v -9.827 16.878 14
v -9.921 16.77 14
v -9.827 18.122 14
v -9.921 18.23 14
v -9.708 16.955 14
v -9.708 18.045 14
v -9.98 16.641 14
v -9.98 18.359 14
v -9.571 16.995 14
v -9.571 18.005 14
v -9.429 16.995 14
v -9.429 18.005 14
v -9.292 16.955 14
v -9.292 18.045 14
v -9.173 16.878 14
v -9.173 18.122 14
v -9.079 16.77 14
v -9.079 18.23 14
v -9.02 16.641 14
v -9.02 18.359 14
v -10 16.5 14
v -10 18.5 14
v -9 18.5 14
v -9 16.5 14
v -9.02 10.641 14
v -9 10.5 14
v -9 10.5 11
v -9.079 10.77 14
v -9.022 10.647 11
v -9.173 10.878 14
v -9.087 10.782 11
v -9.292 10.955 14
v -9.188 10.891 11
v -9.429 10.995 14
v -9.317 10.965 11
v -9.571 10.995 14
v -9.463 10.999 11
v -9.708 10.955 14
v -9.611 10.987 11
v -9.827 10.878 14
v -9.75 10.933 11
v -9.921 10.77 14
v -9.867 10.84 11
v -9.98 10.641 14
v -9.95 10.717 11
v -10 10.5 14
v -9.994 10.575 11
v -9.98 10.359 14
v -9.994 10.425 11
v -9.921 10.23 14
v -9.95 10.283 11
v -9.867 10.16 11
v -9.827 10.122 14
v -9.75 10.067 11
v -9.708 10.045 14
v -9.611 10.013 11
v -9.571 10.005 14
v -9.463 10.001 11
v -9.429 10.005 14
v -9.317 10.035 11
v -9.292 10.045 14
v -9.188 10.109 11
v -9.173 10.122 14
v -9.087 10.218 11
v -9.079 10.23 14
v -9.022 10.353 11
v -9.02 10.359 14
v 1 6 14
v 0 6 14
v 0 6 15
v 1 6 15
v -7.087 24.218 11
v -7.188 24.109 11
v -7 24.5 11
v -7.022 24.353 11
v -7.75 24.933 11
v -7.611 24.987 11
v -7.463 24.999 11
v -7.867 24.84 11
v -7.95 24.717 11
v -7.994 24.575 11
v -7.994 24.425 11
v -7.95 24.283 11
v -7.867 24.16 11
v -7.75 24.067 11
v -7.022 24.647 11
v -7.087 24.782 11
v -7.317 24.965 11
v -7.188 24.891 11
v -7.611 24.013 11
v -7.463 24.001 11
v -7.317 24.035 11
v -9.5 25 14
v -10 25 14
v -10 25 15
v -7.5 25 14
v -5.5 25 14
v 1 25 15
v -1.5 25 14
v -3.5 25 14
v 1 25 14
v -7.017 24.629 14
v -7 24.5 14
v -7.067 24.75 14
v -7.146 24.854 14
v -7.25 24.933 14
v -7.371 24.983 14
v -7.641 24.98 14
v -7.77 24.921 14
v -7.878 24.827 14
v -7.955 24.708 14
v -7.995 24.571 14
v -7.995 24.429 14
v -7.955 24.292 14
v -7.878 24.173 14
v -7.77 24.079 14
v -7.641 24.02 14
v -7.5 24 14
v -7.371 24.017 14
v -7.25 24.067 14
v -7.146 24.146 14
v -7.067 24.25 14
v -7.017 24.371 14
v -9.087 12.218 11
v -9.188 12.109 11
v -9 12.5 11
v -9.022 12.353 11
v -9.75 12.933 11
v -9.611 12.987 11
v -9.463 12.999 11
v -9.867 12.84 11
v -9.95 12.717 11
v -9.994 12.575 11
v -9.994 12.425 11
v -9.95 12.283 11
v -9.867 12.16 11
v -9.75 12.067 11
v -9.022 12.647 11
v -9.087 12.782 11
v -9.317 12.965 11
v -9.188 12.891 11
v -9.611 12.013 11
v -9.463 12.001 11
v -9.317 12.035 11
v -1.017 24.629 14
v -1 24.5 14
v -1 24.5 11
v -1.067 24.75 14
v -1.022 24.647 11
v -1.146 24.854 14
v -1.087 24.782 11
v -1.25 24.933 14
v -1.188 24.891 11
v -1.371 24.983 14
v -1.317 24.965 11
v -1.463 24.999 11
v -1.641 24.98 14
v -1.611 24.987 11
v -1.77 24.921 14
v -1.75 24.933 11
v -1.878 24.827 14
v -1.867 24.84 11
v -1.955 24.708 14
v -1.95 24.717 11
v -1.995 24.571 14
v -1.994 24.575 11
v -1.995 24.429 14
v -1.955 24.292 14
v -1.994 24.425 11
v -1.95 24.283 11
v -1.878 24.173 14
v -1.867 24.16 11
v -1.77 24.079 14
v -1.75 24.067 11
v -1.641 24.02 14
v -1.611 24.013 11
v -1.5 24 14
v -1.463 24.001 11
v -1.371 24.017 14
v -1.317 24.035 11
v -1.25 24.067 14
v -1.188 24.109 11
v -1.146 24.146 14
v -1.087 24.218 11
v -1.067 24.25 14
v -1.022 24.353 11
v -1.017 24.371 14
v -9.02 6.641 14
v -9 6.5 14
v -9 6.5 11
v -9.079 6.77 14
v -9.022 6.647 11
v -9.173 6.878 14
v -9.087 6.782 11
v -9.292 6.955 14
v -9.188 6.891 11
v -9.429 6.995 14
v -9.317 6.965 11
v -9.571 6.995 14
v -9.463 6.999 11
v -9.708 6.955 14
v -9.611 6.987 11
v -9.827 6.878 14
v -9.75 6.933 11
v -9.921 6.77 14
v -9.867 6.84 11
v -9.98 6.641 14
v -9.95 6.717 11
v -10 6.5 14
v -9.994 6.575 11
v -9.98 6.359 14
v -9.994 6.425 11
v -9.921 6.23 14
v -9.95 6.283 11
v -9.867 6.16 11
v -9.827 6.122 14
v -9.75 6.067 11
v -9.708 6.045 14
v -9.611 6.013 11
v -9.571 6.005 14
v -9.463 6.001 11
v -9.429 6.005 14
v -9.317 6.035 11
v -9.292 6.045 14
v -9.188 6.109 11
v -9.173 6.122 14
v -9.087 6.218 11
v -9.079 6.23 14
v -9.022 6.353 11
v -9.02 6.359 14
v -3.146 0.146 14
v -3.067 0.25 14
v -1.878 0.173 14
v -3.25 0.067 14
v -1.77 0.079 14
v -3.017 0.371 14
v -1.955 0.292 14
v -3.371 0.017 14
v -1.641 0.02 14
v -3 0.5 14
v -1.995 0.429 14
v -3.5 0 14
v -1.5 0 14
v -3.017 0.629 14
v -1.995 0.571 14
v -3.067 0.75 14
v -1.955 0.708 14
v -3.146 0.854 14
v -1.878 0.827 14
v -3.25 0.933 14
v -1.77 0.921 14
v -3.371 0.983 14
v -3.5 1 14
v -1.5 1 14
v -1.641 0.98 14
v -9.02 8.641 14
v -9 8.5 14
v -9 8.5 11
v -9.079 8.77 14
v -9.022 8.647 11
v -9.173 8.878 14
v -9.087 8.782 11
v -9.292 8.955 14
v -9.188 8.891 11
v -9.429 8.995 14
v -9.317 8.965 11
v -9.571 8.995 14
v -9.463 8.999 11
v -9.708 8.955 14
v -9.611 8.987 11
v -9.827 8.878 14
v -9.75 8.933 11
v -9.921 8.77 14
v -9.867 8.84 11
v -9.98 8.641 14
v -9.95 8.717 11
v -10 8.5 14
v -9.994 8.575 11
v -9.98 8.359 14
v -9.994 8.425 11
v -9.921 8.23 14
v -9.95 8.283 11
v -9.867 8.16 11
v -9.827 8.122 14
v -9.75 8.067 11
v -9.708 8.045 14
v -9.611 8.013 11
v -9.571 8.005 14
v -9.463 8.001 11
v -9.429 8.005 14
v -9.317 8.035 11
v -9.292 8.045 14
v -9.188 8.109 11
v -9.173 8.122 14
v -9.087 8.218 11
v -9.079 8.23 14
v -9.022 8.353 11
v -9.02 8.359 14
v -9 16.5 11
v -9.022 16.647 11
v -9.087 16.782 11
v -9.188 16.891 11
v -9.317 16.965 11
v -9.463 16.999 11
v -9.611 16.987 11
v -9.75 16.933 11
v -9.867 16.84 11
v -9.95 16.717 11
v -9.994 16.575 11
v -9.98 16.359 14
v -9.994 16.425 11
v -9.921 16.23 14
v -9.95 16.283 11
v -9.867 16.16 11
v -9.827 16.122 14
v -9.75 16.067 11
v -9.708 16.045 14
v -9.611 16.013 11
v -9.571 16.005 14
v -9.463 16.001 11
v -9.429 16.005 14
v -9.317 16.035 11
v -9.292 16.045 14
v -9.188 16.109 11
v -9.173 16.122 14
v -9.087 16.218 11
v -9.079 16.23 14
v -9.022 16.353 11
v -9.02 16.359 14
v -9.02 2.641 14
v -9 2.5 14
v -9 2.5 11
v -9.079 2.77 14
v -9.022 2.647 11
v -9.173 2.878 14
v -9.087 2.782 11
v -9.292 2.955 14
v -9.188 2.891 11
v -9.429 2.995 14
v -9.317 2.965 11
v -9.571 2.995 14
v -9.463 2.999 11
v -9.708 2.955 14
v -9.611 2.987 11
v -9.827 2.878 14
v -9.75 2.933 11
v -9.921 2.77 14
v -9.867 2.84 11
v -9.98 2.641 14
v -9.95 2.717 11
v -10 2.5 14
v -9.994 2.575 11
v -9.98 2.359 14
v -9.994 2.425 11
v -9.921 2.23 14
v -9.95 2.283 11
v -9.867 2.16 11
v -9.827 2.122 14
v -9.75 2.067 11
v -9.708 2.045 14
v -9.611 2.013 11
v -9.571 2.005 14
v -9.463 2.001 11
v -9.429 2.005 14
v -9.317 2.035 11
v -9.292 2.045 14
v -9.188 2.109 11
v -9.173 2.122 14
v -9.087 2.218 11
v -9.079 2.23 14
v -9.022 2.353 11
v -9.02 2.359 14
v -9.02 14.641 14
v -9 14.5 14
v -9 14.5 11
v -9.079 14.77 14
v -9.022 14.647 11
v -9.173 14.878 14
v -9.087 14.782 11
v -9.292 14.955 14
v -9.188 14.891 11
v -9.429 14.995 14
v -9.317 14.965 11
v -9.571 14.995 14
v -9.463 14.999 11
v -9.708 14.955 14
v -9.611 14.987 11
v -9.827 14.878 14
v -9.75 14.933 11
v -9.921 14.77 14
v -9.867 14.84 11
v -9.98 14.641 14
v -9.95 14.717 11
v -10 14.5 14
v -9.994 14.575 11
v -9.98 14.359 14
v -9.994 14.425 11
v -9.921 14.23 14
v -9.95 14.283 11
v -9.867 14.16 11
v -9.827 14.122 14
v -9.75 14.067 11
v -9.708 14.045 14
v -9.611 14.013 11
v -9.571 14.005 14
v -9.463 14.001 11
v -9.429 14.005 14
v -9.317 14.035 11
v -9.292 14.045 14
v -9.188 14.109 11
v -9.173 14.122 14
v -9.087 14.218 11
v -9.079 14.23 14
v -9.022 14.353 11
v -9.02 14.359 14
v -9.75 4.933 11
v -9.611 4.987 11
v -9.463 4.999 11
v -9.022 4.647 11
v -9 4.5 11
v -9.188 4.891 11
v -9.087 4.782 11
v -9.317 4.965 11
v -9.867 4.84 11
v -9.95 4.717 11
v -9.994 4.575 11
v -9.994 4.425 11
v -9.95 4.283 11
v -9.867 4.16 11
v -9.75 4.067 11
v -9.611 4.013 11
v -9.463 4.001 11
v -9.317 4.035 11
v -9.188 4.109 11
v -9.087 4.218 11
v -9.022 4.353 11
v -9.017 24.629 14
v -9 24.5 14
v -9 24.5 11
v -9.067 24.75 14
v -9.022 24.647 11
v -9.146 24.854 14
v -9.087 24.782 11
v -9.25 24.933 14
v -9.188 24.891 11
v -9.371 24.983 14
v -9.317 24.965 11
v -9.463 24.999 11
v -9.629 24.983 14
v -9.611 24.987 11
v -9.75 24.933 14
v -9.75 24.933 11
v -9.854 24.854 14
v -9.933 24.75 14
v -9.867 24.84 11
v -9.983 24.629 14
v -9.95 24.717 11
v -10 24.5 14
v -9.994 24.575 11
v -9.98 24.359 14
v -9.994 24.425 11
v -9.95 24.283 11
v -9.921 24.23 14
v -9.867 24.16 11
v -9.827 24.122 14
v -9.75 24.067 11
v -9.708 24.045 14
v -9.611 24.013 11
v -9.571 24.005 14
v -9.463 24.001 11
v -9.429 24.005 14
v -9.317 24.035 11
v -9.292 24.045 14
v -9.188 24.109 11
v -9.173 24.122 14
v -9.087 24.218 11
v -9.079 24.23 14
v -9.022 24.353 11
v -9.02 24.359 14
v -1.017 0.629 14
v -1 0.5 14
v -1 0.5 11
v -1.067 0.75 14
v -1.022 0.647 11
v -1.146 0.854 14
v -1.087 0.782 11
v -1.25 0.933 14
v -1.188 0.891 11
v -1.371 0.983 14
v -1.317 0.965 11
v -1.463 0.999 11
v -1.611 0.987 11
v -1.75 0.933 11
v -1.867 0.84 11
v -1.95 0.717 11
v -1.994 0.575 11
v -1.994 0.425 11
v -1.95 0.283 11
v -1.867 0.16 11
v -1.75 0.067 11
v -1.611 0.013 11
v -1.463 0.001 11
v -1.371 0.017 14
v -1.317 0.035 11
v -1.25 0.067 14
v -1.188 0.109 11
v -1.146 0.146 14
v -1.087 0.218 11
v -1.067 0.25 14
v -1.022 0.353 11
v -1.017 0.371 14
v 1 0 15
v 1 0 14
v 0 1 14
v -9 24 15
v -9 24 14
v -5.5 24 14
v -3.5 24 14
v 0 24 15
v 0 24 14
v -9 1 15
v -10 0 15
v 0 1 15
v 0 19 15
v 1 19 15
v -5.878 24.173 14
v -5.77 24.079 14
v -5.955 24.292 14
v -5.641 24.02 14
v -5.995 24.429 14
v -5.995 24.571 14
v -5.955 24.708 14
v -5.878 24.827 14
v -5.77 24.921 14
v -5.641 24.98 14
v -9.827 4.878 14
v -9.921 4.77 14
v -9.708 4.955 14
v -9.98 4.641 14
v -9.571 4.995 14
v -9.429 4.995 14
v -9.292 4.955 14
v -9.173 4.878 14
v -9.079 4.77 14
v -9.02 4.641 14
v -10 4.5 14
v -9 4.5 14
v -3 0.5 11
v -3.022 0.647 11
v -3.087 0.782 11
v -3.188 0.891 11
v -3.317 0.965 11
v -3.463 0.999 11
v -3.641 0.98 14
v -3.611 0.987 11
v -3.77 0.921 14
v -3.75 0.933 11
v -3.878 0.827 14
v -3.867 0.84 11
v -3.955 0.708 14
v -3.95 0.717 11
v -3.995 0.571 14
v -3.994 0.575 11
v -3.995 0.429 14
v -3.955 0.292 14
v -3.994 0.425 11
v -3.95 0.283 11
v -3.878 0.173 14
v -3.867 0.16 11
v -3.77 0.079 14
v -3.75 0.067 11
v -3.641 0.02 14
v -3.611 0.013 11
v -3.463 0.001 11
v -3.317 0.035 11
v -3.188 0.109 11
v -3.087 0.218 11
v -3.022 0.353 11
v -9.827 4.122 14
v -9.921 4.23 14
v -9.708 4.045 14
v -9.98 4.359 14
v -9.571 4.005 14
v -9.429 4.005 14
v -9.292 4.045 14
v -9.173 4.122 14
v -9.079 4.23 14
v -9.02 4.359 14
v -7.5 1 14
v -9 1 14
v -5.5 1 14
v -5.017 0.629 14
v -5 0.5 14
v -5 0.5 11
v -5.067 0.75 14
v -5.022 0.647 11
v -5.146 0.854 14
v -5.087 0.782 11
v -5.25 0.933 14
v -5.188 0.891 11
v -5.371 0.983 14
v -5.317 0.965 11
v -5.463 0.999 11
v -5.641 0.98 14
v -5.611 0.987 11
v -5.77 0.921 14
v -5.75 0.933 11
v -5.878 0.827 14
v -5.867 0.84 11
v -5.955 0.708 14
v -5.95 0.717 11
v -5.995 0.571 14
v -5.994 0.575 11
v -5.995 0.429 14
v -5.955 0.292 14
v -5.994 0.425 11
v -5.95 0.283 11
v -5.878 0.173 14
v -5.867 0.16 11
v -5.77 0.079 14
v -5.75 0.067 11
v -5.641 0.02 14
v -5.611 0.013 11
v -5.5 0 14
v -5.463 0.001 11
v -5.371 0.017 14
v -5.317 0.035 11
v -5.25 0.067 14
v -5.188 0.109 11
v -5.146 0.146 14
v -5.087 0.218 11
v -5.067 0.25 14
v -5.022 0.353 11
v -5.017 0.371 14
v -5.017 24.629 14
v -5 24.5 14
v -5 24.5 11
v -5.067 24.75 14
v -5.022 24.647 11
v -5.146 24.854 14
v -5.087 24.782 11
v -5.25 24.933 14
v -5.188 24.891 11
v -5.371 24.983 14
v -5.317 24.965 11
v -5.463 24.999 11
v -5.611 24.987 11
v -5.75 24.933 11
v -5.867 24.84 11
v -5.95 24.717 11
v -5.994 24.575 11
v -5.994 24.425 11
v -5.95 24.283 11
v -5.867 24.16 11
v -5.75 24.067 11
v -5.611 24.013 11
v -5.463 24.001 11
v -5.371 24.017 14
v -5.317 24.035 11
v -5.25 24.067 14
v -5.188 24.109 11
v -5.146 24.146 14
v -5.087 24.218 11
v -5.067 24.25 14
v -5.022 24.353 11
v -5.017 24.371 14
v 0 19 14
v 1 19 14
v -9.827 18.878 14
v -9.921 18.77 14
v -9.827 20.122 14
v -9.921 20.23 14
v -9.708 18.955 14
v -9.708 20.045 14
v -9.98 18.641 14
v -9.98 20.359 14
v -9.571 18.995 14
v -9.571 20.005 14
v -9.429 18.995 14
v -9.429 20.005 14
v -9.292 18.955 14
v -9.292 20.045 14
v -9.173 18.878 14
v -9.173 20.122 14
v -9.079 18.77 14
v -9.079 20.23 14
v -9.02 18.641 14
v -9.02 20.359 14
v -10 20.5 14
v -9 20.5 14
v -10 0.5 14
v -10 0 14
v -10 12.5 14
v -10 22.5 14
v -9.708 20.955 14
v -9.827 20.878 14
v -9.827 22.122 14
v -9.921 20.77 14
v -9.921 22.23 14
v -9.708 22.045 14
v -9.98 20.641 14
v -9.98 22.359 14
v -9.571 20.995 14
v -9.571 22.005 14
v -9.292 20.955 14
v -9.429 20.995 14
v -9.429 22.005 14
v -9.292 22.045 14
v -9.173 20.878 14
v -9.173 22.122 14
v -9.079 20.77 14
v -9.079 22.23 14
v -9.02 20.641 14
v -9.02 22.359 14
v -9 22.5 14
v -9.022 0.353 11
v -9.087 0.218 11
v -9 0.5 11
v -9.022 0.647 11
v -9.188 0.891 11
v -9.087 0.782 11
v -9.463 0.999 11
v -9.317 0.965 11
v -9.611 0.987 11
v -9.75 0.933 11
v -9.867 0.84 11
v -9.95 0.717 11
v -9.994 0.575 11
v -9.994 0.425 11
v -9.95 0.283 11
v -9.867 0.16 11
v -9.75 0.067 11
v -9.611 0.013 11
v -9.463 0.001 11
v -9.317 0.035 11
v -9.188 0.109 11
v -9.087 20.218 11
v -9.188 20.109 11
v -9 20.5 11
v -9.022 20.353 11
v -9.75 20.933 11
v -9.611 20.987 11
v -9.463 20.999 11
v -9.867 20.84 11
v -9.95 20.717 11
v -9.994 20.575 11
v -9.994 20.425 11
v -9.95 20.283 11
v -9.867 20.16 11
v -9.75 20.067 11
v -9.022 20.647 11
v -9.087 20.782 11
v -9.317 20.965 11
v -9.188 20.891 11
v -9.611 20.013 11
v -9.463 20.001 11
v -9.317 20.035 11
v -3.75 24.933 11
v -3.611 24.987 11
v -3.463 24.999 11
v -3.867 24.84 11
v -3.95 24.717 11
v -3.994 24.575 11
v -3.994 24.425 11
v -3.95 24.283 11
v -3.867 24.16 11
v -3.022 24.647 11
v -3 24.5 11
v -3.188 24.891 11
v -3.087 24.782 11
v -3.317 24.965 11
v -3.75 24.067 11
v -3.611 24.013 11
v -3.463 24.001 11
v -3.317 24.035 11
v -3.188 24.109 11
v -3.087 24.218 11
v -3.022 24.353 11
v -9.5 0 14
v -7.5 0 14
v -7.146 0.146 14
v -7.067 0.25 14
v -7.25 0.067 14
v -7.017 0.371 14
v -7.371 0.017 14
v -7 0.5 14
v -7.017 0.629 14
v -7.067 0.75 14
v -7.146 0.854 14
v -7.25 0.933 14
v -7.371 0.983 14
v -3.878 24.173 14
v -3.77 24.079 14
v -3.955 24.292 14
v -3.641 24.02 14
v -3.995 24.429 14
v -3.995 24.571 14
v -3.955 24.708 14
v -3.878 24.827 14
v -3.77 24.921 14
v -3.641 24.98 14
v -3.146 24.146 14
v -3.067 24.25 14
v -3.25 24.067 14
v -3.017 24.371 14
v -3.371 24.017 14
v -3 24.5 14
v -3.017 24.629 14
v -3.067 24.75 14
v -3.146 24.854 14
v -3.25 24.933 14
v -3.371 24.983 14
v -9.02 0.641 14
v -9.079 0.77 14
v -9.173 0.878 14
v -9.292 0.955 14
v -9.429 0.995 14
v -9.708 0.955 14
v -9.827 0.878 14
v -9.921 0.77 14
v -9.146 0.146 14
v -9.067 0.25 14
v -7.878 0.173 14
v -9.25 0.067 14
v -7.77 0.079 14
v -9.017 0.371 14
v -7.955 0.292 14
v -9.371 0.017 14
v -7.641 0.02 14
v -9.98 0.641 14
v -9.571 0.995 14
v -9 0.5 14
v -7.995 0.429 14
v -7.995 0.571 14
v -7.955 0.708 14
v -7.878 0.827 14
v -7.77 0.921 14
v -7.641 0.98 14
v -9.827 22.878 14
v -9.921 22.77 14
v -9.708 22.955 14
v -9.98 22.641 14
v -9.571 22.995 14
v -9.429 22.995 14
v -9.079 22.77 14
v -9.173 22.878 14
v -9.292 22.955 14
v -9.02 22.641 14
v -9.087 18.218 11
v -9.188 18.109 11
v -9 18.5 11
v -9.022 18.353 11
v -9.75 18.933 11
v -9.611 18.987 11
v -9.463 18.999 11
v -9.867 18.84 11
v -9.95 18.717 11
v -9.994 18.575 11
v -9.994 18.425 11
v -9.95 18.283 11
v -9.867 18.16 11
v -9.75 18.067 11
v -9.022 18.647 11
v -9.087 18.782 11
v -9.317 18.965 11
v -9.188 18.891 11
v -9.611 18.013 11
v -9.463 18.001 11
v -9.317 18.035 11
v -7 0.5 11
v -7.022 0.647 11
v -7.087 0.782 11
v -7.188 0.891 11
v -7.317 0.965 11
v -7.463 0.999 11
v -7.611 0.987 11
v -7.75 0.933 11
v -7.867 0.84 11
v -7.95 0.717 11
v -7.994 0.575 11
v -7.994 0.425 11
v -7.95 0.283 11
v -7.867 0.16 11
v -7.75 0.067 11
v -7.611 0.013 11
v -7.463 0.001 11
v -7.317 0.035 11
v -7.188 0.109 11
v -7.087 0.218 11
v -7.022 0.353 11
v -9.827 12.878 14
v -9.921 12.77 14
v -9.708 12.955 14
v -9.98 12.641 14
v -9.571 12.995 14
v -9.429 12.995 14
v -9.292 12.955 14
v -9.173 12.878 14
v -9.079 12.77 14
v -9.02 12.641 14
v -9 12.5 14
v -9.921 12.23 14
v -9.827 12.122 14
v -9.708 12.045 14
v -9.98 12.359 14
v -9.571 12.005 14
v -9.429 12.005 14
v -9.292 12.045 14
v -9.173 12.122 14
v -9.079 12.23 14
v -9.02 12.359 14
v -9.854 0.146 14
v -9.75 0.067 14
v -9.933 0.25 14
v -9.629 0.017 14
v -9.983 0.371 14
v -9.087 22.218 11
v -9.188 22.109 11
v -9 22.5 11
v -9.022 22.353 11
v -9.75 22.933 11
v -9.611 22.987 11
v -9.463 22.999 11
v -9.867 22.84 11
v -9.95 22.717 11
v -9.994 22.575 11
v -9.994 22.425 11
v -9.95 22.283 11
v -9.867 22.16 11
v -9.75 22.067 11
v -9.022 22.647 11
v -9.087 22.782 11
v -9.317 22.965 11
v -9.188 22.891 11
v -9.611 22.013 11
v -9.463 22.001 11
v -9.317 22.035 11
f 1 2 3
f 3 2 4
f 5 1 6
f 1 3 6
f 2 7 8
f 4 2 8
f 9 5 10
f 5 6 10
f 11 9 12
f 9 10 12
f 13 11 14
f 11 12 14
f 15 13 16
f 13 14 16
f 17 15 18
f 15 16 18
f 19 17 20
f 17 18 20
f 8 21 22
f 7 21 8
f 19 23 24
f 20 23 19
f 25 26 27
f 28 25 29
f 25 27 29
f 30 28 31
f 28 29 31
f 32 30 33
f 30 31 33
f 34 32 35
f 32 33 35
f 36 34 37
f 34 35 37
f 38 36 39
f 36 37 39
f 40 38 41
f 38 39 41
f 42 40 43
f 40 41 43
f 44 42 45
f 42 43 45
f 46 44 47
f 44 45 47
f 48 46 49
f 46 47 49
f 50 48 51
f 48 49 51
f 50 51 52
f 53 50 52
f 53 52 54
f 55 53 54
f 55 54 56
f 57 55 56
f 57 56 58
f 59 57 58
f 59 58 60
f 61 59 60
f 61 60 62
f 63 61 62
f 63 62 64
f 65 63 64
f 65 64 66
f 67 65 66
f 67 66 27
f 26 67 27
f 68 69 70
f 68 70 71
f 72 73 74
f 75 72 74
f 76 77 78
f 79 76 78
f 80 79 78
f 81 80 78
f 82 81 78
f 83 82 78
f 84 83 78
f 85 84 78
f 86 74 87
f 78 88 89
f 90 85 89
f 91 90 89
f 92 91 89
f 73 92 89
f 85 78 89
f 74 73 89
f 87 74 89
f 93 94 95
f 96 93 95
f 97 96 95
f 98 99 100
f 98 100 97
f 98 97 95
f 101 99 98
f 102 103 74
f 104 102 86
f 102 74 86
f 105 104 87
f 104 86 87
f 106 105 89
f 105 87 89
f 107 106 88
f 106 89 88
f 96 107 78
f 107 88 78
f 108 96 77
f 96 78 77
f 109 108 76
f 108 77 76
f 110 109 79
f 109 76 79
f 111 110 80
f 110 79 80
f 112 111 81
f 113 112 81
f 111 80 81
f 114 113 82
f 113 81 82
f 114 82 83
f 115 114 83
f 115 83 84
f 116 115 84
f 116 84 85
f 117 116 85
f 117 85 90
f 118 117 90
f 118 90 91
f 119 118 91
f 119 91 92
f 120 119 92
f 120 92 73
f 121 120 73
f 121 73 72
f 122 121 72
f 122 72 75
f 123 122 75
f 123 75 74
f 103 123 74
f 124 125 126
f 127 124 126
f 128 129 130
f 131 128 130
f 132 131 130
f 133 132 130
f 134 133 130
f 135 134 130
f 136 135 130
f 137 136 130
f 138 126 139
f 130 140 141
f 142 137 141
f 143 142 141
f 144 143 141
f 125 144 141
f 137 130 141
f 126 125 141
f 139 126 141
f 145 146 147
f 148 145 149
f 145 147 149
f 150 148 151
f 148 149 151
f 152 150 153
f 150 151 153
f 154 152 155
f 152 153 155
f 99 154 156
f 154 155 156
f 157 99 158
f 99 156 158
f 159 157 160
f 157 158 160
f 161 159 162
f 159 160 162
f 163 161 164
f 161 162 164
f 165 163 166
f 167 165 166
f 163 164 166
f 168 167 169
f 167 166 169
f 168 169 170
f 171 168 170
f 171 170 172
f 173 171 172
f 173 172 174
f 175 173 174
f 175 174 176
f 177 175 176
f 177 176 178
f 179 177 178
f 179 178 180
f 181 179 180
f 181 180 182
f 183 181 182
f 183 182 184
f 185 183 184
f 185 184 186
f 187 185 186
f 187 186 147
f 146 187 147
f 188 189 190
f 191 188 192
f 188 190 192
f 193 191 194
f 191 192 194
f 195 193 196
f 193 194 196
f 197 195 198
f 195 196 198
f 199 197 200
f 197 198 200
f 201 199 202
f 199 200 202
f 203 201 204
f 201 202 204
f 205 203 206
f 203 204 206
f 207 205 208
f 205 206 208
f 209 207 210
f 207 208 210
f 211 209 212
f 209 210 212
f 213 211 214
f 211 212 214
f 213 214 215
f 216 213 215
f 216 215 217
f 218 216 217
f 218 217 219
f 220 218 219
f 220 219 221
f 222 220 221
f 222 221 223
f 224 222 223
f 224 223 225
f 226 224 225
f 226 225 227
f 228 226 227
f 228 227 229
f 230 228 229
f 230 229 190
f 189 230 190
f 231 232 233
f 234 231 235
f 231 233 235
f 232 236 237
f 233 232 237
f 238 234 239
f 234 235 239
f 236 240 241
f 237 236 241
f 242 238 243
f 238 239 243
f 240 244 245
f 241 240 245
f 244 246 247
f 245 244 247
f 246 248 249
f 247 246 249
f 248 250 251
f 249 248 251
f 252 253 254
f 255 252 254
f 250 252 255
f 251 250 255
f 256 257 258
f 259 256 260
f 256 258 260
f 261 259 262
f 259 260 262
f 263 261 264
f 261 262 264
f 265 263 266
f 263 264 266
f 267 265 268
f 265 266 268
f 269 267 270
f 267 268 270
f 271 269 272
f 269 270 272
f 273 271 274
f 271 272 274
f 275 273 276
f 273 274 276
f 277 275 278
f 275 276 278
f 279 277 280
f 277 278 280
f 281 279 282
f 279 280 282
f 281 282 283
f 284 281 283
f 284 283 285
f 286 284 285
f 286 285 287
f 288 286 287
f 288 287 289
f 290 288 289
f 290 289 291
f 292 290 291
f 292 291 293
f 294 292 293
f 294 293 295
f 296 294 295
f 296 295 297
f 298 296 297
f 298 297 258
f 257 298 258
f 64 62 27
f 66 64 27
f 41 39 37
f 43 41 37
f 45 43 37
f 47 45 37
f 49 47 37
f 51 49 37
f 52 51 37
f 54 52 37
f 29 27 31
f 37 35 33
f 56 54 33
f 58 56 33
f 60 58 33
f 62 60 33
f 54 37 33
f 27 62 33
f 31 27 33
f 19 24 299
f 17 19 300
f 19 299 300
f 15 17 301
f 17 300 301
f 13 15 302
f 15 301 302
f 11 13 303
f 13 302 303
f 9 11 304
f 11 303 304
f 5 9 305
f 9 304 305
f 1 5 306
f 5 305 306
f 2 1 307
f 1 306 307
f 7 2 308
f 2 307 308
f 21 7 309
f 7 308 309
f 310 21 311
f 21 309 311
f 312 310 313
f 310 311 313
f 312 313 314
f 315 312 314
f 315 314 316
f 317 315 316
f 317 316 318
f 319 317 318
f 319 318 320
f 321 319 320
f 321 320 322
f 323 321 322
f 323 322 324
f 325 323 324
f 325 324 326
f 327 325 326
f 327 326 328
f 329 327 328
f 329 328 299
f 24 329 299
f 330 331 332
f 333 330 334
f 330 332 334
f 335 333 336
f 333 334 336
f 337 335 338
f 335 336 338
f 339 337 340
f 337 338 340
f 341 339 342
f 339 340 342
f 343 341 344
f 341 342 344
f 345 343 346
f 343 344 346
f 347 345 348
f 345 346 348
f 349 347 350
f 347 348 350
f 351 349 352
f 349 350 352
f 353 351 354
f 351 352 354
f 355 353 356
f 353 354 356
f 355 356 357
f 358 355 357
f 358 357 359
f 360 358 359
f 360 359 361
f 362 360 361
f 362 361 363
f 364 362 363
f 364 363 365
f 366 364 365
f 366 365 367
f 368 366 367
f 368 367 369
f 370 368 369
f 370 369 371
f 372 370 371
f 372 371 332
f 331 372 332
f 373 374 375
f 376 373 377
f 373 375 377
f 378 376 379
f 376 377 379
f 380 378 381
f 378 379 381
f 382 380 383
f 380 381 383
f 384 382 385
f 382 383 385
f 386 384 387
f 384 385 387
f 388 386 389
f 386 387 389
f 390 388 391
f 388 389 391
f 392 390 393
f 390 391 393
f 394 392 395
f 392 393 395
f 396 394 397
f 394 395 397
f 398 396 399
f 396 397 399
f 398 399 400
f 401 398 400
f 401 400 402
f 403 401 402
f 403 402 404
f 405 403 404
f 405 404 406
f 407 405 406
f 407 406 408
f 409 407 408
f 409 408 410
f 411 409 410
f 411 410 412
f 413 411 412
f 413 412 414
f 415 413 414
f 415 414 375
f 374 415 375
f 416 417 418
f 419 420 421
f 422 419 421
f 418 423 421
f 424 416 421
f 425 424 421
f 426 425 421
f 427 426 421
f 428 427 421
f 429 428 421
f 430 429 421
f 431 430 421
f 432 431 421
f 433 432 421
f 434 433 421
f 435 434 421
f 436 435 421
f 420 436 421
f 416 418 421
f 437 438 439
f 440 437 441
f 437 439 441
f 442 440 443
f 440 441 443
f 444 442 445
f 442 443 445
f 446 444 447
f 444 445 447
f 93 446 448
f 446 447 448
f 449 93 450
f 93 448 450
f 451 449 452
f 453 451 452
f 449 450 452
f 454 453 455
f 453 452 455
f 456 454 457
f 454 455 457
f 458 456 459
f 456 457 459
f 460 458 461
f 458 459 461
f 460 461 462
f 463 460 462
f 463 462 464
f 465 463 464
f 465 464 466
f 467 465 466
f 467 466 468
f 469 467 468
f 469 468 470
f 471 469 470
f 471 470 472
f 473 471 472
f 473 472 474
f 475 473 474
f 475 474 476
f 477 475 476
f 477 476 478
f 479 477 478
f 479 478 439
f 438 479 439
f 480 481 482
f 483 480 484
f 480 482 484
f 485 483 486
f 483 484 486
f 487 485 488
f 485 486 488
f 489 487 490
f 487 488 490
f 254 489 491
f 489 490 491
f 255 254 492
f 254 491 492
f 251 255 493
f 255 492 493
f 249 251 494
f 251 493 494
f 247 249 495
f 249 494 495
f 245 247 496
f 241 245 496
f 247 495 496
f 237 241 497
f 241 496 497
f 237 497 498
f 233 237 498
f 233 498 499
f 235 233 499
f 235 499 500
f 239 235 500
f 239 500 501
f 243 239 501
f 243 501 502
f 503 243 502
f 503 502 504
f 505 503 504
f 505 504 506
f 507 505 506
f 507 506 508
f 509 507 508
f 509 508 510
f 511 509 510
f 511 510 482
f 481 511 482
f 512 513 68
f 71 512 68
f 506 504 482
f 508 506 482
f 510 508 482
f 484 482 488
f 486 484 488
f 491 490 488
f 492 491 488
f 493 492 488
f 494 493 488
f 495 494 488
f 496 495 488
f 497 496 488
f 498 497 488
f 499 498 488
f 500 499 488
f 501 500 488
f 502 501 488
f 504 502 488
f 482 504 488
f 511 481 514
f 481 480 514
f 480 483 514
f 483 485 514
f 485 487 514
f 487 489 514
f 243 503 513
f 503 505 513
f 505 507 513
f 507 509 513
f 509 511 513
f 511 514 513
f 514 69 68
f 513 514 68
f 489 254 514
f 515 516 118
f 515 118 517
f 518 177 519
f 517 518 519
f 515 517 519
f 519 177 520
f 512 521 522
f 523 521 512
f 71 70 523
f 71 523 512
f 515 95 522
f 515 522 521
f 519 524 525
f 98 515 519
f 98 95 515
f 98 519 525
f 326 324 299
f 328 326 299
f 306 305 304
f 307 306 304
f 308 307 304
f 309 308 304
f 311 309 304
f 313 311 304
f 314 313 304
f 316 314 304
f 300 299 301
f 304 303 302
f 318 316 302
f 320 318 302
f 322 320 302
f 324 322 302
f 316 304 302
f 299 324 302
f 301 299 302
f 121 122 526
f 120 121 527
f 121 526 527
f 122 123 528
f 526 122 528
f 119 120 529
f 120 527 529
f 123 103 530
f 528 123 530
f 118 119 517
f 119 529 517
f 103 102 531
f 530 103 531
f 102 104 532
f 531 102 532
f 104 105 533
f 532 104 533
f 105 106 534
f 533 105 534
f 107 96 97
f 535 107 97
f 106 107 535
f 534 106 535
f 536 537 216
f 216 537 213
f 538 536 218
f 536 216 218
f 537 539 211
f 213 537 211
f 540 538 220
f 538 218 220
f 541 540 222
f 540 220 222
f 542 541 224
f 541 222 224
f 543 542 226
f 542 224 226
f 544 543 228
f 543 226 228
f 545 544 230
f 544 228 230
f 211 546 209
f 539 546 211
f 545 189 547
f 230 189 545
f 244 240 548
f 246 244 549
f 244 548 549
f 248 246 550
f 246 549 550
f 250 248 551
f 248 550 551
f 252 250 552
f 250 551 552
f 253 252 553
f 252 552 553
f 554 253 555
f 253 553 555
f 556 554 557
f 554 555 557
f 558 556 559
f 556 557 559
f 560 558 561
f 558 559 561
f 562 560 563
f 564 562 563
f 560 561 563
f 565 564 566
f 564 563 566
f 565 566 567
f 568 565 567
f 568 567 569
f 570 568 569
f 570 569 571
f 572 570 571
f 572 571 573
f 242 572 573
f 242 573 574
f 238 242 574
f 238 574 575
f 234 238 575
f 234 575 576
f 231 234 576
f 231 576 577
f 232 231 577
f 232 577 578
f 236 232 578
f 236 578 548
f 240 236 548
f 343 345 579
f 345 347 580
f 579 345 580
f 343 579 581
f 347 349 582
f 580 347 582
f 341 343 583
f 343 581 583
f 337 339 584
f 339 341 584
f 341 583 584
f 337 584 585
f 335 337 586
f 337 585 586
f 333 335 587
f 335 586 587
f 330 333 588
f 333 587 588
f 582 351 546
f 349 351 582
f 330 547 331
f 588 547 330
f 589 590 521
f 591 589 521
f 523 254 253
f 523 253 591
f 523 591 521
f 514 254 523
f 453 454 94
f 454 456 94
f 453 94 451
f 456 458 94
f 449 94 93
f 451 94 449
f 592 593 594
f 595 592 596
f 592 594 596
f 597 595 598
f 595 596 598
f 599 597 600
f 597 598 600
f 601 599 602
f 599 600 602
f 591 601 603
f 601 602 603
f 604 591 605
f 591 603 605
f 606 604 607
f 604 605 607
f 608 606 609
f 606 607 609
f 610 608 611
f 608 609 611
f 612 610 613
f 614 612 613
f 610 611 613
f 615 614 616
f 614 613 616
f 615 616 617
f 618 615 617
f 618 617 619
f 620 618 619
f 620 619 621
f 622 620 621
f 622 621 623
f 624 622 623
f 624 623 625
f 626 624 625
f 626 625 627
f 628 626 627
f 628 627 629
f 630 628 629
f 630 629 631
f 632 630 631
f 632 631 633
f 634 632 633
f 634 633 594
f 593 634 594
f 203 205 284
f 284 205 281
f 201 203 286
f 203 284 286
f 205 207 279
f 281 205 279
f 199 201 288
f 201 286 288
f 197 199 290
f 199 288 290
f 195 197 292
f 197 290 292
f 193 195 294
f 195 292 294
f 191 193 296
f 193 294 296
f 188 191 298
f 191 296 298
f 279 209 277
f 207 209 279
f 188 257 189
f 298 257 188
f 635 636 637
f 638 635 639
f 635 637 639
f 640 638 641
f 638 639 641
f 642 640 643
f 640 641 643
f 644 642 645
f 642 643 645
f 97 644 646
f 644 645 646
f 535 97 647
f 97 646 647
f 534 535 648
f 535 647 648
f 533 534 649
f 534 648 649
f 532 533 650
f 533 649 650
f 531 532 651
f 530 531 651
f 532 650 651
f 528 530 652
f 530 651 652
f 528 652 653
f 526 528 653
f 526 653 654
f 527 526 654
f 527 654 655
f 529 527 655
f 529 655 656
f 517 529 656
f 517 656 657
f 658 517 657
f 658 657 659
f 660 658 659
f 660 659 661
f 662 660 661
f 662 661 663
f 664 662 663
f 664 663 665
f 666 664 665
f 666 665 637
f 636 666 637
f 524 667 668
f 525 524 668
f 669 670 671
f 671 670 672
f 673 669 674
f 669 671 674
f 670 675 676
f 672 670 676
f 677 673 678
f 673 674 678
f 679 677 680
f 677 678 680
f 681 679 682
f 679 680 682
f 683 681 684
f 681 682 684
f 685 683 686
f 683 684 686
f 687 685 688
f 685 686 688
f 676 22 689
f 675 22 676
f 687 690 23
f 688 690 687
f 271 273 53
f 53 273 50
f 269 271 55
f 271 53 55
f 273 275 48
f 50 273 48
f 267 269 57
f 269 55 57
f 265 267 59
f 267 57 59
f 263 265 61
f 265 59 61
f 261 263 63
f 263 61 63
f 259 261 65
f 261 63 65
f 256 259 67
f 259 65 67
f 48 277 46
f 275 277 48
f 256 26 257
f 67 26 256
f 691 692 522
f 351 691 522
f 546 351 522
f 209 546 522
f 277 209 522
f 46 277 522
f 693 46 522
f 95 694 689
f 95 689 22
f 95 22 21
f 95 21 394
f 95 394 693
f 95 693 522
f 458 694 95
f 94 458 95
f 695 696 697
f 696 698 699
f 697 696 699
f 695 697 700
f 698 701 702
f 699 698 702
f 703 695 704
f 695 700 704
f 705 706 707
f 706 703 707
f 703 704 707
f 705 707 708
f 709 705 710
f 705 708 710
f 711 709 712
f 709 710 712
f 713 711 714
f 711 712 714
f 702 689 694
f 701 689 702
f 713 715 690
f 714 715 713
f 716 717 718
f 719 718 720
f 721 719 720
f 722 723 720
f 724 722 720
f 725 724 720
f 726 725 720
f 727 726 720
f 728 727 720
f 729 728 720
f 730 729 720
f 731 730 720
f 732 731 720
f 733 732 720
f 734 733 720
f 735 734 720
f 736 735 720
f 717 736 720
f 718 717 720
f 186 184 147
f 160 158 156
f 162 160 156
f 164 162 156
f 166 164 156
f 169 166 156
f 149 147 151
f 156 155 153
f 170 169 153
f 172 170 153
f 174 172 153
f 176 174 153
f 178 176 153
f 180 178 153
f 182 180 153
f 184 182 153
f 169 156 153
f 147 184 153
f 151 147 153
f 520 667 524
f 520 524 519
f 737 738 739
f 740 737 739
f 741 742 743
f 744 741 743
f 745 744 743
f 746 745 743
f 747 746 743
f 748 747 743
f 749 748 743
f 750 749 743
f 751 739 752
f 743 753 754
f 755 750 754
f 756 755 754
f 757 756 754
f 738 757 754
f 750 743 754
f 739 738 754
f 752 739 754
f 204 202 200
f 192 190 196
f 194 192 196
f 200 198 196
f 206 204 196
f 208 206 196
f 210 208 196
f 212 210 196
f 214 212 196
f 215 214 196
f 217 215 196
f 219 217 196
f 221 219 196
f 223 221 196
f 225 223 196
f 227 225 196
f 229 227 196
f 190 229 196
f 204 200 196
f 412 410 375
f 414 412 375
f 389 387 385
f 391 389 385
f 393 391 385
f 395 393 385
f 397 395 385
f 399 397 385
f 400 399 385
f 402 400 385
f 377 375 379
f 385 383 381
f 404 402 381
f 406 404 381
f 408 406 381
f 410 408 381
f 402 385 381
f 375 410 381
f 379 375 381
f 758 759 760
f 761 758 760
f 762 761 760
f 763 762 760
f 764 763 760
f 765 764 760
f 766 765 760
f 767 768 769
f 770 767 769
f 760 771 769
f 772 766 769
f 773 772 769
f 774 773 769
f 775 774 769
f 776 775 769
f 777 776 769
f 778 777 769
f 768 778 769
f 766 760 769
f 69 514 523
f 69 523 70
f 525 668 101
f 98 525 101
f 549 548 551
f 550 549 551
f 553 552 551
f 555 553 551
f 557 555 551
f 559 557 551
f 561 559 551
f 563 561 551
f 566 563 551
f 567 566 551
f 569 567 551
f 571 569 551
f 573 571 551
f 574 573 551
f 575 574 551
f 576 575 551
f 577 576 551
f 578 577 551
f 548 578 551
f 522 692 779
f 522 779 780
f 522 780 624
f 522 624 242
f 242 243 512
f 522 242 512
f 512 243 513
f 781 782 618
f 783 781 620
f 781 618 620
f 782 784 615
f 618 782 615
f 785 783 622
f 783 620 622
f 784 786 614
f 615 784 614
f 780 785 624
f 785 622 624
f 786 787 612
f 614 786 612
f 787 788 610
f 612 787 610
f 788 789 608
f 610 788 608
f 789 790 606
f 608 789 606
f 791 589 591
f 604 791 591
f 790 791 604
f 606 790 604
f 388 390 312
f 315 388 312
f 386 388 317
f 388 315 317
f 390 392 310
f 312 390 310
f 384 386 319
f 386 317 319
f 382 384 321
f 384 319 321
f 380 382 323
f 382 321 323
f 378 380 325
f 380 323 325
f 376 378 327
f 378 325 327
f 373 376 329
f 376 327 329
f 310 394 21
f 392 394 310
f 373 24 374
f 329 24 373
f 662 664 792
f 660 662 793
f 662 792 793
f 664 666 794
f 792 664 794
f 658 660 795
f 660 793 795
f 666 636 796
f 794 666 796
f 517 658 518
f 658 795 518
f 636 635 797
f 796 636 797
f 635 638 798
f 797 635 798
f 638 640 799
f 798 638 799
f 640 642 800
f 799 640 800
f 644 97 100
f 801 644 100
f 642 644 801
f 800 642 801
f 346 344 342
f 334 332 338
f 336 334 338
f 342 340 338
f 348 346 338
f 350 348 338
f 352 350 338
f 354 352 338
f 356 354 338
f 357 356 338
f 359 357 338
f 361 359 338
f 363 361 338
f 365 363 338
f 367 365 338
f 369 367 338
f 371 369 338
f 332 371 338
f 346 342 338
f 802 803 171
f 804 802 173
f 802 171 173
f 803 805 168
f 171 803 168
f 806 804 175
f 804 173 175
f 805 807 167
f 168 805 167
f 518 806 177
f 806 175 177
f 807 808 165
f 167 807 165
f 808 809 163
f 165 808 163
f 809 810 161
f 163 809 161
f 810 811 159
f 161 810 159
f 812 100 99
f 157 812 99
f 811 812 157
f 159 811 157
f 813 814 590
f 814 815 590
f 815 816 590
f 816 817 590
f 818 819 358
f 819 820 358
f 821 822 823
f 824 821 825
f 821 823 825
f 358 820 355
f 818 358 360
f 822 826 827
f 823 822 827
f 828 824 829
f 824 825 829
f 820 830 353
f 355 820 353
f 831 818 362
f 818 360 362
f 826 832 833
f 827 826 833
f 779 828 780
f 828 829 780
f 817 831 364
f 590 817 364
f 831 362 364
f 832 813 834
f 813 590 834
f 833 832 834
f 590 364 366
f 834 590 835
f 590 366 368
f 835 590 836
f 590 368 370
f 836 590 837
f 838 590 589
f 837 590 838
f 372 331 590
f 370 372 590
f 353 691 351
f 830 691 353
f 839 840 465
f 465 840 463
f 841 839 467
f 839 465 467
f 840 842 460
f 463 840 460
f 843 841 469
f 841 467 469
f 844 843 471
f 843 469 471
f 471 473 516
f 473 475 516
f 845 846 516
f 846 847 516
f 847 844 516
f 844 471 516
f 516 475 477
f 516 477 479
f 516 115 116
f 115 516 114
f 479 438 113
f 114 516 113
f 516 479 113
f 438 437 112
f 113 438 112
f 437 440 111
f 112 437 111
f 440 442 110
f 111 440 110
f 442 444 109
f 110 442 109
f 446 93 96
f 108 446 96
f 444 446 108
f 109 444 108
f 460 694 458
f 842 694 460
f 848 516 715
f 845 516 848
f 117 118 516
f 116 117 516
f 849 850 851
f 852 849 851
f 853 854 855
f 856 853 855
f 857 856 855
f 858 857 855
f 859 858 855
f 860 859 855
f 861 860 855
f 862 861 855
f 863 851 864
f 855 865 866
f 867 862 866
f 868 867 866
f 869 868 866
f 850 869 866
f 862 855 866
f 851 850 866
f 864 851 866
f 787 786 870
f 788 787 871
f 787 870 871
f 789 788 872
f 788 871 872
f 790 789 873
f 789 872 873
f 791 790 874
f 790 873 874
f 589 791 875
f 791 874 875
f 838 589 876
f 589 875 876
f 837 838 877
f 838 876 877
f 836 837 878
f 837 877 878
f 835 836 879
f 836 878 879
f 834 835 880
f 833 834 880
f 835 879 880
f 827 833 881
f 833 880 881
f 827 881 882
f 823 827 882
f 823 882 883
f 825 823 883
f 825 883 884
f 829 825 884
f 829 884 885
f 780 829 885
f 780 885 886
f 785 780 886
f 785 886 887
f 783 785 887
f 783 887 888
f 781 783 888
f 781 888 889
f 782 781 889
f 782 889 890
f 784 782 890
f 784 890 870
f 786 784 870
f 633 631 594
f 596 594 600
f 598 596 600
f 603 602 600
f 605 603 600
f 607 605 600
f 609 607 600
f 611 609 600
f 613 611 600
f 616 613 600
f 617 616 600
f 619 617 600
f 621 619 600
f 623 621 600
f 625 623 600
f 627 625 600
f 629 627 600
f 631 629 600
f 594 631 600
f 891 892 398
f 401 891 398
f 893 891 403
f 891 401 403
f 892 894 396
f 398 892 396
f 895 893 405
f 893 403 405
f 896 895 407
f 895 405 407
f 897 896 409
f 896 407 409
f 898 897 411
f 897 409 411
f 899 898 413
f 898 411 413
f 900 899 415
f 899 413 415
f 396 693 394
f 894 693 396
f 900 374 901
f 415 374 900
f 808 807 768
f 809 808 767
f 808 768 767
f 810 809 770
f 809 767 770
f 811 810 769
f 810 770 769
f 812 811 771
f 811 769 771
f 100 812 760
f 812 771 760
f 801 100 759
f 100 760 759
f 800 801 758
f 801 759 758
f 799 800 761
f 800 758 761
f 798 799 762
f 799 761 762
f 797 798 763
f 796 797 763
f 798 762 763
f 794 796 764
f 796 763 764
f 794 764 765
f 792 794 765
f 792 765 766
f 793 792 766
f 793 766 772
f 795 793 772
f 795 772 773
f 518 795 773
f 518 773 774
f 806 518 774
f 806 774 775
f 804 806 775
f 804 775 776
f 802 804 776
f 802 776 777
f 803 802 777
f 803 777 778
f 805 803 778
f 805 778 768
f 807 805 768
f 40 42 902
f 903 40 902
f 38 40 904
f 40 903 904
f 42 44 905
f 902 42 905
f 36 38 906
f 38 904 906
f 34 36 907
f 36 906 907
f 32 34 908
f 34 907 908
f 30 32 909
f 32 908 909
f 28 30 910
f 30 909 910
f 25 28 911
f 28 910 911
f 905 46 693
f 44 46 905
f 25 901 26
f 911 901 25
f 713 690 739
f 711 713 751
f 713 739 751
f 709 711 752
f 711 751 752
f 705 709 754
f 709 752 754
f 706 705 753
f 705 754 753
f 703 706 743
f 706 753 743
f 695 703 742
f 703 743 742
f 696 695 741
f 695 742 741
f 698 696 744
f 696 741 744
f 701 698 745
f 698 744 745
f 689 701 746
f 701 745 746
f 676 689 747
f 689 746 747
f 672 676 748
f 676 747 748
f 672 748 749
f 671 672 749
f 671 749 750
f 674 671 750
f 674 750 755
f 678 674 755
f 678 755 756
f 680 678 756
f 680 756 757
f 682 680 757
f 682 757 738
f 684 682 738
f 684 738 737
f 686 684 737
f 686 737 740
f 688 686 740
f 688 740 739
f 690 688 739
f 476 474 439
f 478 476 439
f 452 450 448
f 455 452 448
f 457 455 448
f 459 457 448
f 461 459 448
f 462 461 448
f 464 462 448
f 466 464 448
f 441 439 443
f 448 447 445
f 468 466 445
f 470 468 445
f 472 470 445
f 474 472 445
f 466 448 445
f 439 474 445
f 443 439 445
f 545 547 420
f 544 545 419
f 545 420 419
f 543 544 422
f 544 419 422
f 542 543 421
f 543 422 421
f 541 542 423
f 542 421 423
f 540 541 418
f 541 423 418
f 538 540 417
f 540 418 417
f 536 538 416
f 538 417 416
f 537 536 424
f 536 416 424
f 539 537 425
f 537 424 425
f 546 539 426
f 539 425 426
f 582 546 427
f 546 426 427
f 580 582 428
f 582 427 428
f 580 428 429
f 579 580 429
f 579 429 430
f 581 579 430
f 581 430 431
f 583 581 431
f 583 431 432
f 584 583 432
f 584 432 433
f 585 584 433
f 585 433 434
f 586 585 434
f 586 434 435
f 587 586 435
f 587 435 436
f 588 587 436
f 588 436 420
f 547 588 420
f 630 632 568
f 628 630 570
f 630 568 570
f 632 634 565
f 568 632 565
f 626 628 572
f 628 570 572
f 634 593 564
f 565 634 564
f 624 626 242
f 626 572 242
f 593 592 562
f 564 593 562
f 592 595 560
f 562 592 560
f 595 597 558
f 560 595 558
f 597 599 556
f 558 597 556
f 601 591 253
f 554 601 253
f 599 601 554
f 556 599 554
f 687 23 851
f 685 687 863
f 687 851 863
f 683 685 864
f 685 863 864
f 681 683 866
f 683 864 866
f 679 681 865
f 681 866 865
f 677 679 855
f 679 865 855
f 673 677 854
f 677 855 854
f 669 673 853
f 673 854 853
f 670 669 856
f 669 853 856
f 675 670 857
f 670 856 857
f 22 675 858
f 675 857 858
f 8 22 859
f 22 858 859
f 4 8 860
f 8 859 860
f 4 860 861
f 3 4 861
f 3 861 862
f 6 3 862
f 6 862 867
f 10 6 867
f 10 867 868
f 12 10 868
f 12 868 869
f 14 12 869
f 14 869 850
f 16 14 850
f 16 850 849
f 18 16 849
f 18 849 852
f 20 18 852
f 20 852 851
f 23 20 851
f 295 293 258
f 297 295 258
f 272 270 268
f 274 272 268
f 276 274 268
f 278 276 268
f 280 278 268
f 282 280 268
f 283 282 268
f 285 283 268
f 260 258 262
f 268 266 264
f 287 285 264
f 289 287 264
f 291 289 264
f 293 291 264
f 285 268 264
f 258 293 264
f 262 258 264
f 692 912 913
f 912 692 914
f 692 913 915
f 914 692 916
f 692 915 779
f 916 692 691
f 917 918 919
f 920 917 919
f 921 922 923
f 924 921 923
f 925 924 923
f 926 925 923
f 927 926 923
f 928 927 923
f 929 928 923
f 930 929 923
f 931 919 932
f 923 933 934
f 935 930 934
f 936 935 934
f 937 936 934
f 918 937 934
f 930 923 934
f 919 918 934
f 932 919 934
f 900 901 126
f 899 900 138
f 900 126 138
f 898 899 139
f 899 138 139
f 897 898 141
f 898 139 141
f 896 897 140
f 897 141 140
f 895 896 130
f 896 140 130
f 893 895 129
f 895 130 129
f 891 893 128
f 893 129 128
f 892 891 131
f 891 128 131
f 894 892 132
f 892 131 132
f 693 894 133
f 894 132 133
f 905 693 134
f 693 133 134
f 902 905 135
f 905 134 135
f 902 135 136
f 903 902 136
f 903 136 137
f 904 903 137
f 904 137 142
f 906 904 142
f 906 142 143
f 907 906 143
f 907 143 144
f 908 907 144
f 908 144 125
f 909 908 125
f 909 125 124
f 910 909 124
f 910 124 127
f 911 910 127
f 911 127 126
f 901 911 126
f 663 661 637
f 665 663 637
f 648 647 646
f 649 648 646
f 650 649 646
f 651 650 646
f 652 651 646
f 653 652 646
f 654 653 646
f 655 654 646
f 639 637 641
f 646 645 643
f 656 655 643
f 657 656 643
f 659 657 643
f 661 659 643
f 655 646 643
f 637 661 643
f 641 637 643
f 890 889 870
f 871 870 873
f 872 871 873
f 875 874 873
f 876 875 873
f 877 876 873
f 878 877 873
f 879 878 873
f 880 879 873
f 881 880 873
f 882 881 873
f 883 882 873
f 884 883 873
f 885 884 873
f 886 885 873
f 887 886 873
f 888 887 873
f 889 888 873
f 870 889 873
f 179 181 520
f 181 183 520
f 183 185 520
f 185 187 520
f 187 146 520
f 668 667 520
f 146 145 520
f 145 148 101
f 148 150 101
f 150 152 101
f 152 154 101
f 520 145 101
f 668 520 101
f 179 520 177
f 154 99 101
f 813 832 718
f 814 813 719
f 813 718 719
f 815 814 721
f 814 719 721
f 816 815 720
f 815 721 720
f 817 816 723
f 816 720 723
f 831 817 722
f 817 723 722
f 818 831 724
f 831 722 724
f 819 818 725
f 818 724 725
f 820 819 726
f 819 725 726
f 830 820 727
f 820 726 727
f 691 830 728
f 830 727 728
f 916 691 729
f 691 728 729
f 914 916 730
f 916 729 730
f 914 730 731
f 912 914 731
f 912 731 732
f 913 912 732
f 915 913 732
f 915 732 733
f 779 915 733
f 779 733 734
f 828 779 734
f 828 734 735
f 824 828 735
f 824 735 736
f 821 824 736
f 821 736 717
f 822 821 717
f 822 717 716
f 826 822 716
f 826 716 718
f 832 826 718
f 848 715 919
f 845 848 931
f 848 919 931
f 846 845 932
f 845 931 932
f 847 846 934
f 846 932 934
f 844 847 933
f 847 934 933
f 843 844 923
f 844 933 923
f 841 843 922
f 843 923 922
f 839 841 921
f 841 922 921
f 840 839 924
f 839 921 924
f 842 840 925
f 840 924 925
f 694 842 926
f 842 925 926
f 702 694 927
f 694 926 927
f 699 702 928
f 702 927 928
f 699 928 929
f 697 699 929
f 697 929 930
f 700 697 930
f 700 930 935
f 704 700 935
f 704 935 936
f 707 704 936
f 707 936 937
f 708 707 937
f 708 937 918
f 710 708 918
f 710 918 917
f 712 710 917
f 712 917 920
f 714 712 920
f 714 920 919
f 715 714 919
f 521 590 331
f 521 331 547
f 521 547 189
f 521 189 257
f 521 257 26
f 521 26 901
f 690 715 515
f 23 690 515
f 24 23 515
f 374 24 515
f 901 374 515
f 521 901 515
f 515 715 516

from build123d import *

# Parameters (mm, degrees)
BOX114_W          = 9
BOX114_H          = 1
BOX114_DEPTH      = 1
CYLINDER025_R     = 0.5
CYLINDER025_DEPTH = 3
CYLINDER023_R     = 0.5
CYLINDER023_DEPTH = 3
CYLINDER024_R     = 0.5
CYLINDER024_DEPTH = 3
CYLINDER026_R     = 0.5
CYLINDER026_DEPTH = 3
CYLINDER021_R     = 0.5
CYLINDER021_DEPTH = 3
CYLINDER020_R     = 0.5
CYLINDER020_DEPTH = 3
CYLINDER019_R     = 0.5
CYLINDER019_DEPTH = 3
CYLINDER022_R     = 0.5
CYLINDER022_DEPTH = 3
BOX113_W          = 9
BOX113_H          = 1
BOX113_DEPTH      = 1
CYLINDER007_R     = 0.5
CYLINDER007_DEPTH = 3
CYLINDER009_R     = 0.5
CYLINDER009_DEPTH = 3
CYLINDER008_R     = 0.5
CYLINDER008_DEPTH = 3
CYLINDER010_R     = 0.5
CYLINDER010_DEPTH = 3
CYLINDER011_R     = 0.5
CYLINDER011_DEPTH = 3
CYLINDER013_R     = 0.5
CYLINDER013_DEPTH = 3
CYLINDER012_R     = 0.5
CYLINDER012_DEPTH = 3
CYLINDER014_R     = 0.5
CYLINDER014_DEPTH = 3
CYLINDER015_R     = 0.5
CYLINDER015_DEPTH = 3
CYLINDER016_R     = 0.5
CYLINDER016_DEPTH = 3
CYLINDER017_R     = 0.5
CYLINDER017_DEPTH = 3
CYLINDER018_R     = 0.5
CYLINDER018_DEPTH = 3
CYLINDER006_R     = 0.5
CYLINDER006_DEPTH = 3
BOX112_W          = 1
BOX112_H          = 25
BOX112_DEPTH      = 1
BOX115_W          = 1
BOX115_H          = 6
BOX115_DEPTH      = 1
BOX116_W          = 1
BOX116_H          = 6
BOX116_DEPTH      = 1


with BuildPart() as box114:
    # Box114 → Box114 (new body)
    with BuildSketch(Plane(origin=(-9, 24, 14), x_dir=(1, 0, 0), z_dir=(0, 0, 1))):
        with Locations((4.5, 0.5)):
            Rectangle(BOX114_W, BOX114_H)
    extrude(amount=BOX114_DEPTH)


with BuildPart() as cylinder025:
    # Cylinder025 → Cylinder025 (new body)
    with BuildSketch(Plane(origin=(-1.5, 0.5, 11), x_dir=(1, 0, 0), z_dir=(0, 0, 1))):
        Circle(CYLINDER025_R)
    extrude(amount=CYLINDER025_DEPTH)


with BuildPart() as cylinder023:
    # Cylinder023 → Cylinder023 (new body)
    with BuildSketch(Plane(origin=(-7.5, 0.5, 11), x_dir=(1, 0, 0), z_dir=(0, 0, 1))):
        Circle(CYLINDER023_R)
    extrude(amount=CYLINDER023_DEPTH)


with BuildPart() as cylinder024:
    # Cylinder024 → Cylinder024 (new body)
    with BuildSketch(Plane(origin=(-5.5, 0.5, 11), x_dir=(1, 0, 0), z_dir=(0, 0, 1))):
        Circle(CYLINDER024_R)
    extrude(amount=CYLINDER024_DEPTH)


with BuildPart() as fusion057:
    # Cylinder026 → Cylinder026 (new body)
    with BuildSketch(Plane(origin=(-3.5, 0.5, 11), x_dir=(1, 0, 0), z_dir=(0, 0, 1))):
        Circle(CYLINDER026_R)
    extrude(amount=CYLINDER026_DEPTH)

    # Fusion056: union Cylinder025, Cylinder023, Cylinder024
    add(cylinder025.part)
    add(cylinder023.part)
    add(cylinder024.part)


with BuildPart() as fusion057_1:
    # Fusion056 placement: moved
    add(fusion057.part.moved(Location((0, 24, 0))))

    # Fusion057: union Box114
    add(box114.part)


with BuildPart() as cylinder021:
    # Cylinder021 → Cylinder021 (new body)
    with BuildSketch(Plane(origin=(-1.5, 0.5, 11), x_dir=(1, 0, 0), z_dir=(0, 0, 1))):
        Circle(CYLINDER021_R)
    extrude(amount=CYLINDER021_DEPTH)


with BuildPart() as cylinder020:
    # Cylinder020 → Cylinder020 (new body)
    with BuildSketch(Plane(origin=(-7.5, 0.5, 11), x_dir=(1, 0, 0), z_dir=(0, 0, 1))):
        Circle(CYLINDER020_R)
    extrude(amount=CYLINDER020_DEPTH)


with BuildPart() as cylinder019:
    # Cylinder019 → Cylinder019 (new body)
    with BuildSketch(Plane(origin=(-5.5, 0.5, 11), x_dir=(1, 0, 0), z_dir=(0, 0, 1))):
        Circle(CYLINDER019_R)
    extrude(amount=CYLINDER019_DEPTH)


with BuildPart() as fusion055:
    # Cylinder022 → Cylinder022 (new body)
    with BuildSketch(Plane(origin=(-3.5, 0.5, 11), x_dir=(1, 0, 0), z_dir=(0, 0, 1))):
        Circle(CYLINDER022_R)
    extrude(amount=CYLINDER022_DEPTH)

    # Fusion055: union Cylinder021, Cylinder020, Cylinder019
    add(cylinder021.part)
    add(cylinder020.part)
    add(cylinder019.part)


with BuildPart() as fusion058:
    # Box113 → Box113 (new body)
    with BuildSketch(Plane(origin=(-9, 0, 14), x_dir=(1, 0, 0), z_dir=(0, 0, 1))):
        with Locations((4.5, 0.5)):
            Rectangle(BOX113_W, BOX113_H)
    extrude(amount=BOX113_DEPTH)

    # Fusion058: union Fusion055
    add(fusion055.part)


with BuildPart() as cylinder007:
    # Cylinder007 → Cylinder007 (new body)
    with BuildSketch(Plane(origin=(-9.5, 2.5, 11), x_dir=(1, 0, 0), z_dir=(0, 0, 1))):
        Circle(CYLINDER007_R)
    extrude(amount=CYLINDER007_DEPTH)


with BuildPart() as cylinder009:
    # Cylinder009 → Cylinder009 (new body)
    with BuildSketch(Plane(origin=(-9.5, 6.5, 11), x_dir=(1, 0, 0), z_dir=(0, 0, 1))):
        Circle(CYLINDER009_R)
    extrude(amount=CYLINDER009_DEPTH)


with BuildPart() as cylinder008:
    # Cylinder008 → Cylinder008 (new body)
    with BuildSketch(Plane(origin=(-9.5, 4.5, 11), x_dir=(1, 0, 0), z_dir=(0, 0, 1))):
        Circle(CYLINDER008_R)
    extrude(amount=CYLINDER008_DEPTH)


with BuildPart() as cylinder010:
    # Cylinder010 → Cylinder010 (new body)
    with BuildSketch(Plane(origin=(-9.5, 8.5, 11), x_dir=(1, 0, 0), z_dir=(0, 0, 1))):
        Circle(CYLINDER010_R)
    extrude(amount=CYLINDER010_DEPTH)


with BuildPart() as cylinder011:
    # Cylinder011 → Cylinder011 (new body)
    with BuildSketch(Plane(origin=(-9.5, 10.5, 11), x_dir=(1, 0, 0), z_dir=(0, 0, 1))):
        Circle(CYLINDER011_R)
    extrude(amount=CYLINDER011_DEPTH)


with BuildPart() as cylinder013:
    # Cylinder013 → Cylinder013 (new body)
    with BuildSketch(Plane(origin=(-9.5, 14.5, 11), x_dir=(1, 0, 0), z_dir=(0, 0, 1))):
        Circle(CYLINDER013_R)
    extrude(amount=CYLINDER013_DEPTH)


with BuildPart() as cylinder012:
    # Cylinder012 → Cylinder012 (new body)
    with BuildSketch(Plane(origin=(-9.5, 12.5, 11), x_dir=(1, 0, 0), z_dir=(0, 0, 1))):
        Circle(CYLINDER012_R)
    extrude(amount=CYLINDER012_DEPTH)


with BuildPart() as cylinder014:
    # Cylinder014 → Cylinder014 (new body)
    with BuildSketch(Plane(origin=(-9.5, 16.5, 11), x_dir=(1, 0, 0), z_dir=(0, 0, 1))):
        Circle(CYLINDER014_R)
    extrude(amount=CYLINDER014_DEPTH)


with BuildPart() as cylinder015:
    # Cylinder015 → Cylinder015 (new body)
    with BuildSketch(Plane(origin=(-9.5, 18.5, 11), x_dir=(1, 0, 0), z_dir=(0, 0, 1))):
        Circle(CYLINDER015_R)
    extrude(amount=CYLINDER015_DEPTH)


with BuildPart() as cylinder016:
    # Cylinder016 → Cylinder016 (new body)
    with BuildSketch(Plane(origin=(-9.5, 20.5, 11), x_dir=(1, 0, 0), z_dir=(0, 0, 1))):
        Circle(CYLINDER016_R)
    extrude(amount=CYLINDER016_DEPTH)


with BuildPart() as cylinder017:
    # Cylinder017 → Cylinder017 (new body)
    with BuildSketch(Plane(origin=(-9.5, 22.5, 11), x_dir=(1, 0, 0), z_dir=(0, 0, 1))):
        Circle(CYLINDER017_R)
    extrude(amount=CYLINDER017_DEPTH)


with BuildPart() as cylinder018:
    # Cylinder018 → Cylinder018 (new body)
    with BuildSketch(Plane(origin=(-9.5, 24.5, 11), x_dir=(1, 0, 0), z_dir=(0, 0, 1))):
        Circle(CYLINDER018_R)
    extrude(amount=CYLINDER018_DEPTH)


with BuildPart() as fusion053:
    # Cylinder006 → Cylinder006 (new body)
    with BuildSketch(Plane(origin=(-9.5, 0.5, 11), x_dir=(1, 0, 0), z_dir=(0, 0, 1))):
        Circle(CYLINDER006_R)
    extrude(amount=CYLINDER006_DEPTH)

    # Fusion053: union Cylinder007, Cylinder009, Cylinder008, Cylinder010, Cylinder011, Cylinder013, Cylinder012, Cylinder014, Cylinder015, Cylinder016, Cylinder017, Cylinder018
    add(cylinder007.part)
    add(cylinder009.part)
    add(cylinder008.part)
    add(cylinder010.part)
    add(cylinder011.part)
    add(cylinder013.part)
    add(cylinder012.part)
    add(cylinder014.part)
    add(cylinder015.part)
    add(cylinder016.part)
    add(cylinder017.part)
    add(cylinder018.part)


with BuildPart() as fusion060:
    # Box112 → Box112 (new body)
    with BuildSketch(Plane(origin=(-10, 0, 14), x_dir=(1, 0, 0), z_dir=(0, 0, 1))):
        with Locations((0.5, 12.5)):
            Rectangle(BOX112_W, BOX112_H)
    extrude(amount=BOX112_DEPTH)

    # Fusion054: union Fusion053
    add(fusion053.part)

    # Fusion060: union Fusion057, Fusion058
    add(fusion057_1.part)
    add(fusion058.part)


with BuildPart() as box115:
    # Box115 → Box115 (new body)
    with BuildSketch(Plane.XY.offset(14)):
        with Locations((0.5, 3)):
            Rectangle(BOX115_W, BOX115_H)
    extrude(amount=BOX115_DEPTH)


with BuildPart() as fusion062:
    # Box116 → Box116 (new body)
    with BuildSketch(Plane(origin=(0, 19, 14), x_dir=(1, 0, 0), z_dir=(0, 0, 1))):
        with Locations((0.5, 3)):
            Rectangle(BOX116_W, BOX116_H)
    extrude(amount=BOX116_DEPTH)

    # Fusion061: union Box115
    add(box115.part)

    # Fusion062: union Fusion060
    add(fusion060.part)


solid = fusion062.part
